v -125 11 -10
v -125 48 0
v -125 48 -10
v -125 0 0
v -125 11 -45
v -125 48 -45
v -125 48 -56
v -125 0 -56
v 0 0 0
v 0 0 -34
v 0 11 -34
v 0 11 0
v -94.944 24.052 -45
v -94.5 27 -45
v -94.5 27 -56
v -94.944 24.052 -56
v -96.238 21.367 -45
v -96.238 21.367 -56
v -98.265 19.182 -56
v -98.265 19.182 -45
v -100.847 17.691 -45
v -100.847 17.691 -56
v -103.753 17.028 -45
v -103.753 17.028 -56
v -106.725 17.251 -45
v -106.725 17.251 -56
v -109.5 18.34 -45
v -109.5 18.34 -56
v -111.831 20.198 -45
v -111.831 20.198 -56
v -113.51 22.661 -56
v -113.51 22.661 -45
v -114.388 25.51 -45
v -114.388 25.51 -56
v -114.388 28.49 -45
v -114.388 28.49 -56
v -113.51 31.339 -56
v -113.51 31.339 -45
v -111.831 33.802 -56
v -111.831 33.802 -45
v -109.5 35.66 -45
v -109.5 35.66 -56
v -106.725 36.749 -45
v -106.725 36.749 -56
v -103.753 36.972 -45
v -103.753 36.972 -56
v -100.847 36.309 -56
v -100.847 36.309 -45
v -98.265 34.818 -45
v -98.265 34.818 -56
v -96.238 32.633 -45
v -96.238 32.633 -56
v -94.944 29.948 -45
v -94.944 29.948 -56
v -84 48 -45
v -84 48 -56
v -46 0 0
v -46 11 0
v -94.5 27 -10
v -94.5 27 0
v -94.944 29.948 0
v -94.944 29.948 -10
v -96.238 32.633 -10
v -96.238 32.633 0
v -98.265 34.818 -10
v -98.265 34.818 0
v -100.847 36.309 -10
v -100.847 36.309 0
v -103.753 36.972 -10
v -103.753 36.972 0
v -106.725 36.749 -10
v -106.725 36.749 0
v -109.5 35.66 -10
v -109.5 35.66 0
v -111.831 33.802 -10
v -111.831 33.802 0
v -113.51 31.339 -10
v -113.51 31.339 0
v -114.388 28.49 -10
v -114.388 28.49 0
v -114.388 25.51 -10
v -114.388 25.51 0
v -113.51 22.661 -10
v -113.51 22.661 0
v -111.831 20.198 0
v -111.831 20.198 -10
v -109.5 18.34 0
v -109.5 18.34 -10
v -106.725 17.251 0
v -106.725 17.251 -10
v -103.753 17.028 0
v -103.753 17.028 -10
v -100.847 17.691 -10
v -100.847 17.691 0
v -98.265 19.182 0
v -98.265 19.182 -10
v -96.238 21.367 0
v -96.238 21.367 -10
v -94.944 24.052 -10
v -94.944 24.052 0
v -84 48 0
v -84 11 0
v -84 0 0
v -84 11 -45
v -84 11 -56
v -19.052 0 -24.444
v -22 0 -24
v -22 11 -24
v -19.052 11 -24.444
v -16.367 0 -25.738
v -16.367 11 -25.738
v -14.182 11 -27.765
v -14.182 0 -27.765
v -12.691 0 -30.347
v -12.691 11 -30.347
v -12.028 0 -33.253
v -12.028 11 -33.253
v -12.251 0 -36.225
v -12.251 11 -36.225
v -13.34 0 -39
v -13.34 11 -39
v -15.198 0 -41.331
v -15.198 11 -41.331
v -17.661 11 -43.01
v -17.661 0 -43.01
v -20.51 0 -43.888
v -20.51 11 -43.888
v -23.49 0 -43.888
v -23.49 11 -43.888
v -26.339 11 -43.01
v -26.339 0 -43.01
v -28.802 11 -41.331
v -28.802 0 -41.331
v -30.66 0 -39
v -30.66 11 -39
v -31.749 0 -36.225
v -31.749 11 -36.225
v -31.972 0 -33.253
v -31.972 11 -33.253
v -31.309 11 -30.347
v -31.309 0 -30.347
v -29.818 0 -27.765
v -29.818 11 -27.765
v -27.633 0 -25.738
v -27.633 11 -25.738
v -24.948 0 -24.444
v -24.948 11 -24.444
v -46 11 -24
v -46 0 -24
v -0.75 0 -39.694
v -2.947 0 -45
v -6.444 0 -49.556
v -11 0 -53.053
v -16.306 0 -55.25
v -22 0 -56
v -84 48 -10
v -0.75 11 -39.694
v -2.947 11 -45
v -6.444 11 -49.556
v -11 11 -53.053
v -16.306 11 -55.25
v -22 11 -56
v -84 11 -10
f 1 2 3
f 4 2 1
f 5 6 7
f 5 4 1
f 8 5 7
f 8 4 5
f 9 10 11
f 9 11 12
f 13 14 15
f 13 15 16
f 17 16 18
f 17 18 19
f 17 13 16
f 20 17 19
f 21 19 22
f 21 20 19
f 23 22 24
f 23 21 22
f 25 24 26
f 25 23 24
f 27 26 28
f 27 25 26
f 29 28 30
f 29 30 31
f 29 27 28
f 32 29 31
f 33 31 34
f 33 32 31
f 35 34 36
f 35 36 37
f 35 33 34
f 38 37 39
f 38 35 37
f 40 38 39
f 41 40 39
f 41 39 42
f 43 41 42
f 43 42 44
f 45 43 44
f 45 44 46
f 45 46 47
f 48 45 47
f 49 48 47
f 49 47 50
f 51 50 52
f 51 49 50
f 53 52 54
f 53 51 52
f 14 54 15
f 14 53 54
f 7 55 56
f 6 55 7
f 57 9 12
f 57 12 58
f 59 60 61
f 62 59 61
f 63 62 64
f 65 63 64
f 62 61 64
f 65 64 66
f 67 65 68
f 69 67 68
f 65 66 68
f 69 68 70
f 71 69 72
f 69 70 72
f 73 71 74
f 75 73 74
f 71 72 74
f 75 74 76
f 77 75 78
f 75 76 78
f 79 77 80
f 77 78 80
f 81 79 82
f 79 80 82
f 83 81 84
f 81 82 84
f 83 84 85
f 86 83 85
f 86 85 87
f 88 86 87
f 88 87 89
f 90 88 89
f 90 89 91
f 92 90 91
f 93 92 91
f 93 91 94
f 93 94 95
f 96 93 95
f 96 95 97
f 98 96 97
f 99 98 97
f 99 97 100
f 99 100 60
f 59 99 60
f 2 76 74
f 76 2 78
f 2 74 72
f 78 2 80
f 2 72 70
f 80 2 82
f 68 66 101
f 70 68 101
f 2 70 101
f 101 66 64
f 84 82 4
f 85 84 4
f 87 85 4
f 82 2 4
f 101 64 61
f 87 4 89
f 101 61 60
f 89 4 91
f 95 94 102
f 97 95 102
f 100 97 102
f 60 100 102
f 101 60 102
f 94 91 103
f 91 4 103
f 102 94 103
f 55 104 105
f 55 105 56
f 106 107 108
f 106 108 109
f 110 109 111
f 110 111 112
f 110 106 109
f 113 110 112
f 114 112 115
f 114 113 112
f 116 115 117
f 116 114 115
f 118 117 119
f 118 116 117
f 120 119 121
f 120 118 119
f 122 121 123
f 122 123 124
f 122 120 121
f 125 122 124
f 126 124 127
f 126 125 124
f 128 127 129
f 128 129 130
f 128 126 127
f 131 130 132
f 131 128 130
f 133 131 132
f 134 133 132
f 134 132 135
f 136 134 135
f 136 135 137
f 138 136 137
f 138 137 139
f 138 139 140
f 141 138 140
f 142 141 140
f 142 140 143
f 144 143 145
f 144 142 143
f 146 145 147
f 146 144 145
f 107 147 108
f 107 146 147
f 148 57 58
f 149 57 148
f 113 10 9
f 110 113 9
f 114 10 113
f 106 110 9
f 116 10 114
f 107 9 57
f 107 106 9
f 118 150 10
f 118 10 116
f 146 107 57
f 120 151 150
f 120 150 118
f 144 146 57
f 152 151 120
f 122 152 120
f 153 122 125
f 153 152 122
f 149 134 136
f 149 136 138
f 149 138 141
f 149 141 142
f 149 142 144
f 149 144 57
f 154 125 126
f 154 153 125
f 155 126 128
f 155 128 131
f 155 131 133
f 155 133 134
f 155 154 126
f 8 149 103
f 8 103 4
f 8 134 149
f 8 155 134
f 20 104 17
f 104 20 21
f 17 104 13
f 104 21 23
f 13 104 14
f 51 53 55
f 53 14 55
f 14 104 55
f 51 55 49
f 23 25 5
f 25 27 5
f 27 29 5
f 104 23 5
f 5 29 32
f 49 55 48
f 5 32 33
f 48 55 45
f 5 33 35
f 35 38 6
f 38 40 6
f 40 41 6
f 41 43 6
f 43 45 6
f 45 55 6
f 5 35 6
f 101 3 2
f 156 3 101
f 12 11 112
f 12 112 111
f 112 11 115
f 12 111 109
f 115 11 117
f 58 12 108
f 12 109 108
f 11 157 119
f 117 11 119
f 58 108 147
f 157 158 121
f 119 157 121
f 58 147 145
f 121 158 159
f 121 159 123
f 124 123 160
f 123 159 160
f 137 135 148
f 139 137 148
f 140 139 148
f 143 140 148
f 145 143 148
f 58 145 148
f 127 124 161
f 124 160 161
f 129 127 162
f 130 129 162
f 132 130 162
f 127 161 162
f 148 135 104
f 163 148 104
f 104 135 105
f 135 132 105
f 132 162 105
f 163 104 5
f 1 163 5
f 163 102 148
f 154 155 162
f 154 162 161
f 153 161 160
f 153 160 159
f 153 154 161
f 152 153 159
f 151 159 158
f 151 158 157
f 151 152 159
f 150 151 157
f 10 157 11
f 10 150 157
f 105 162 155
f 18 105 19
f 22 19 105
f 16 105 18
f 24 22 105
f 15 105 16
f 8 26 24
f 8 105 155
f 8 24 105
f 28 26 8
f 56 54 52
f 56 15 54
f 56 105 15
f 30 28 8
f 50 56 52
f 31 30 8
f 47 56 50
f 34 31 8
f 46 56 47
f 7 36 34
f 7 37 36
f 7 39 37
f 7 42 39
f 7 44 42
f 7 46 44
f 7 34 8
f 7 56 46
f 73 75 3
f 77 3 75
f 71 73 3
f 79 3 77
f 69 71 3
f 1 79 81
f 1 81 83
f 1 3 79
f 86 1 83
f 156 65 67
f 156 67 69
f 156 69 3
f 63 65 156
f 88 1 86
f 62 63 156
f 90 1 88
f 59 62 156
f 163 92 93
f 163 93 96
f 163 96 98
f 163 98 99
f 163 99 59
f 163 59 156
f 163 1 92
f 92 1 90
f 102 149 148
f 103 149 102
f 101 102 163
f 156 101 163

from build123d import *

# Parameters (mm, degrees)
SKETCH1_R           = 10
BOSS_EXTRUDE1_DEPTH = 11
SKETCH3_W           = 41
SKETCH3_H           = 10
BOSS_EXTRUDE2_DEPTH = 37
SKETCH4_R           = 10
CUT_EXTRUDE1_DEPTH  = 37
BOSS_EXTRUDE3_START = -11
SKETCH5_W           = 41
SKETCH5_H           = 37
SKETCH5_R           = 10
BOSS_EXTRUDE3_DEPTH = 11


with BuildPart() as part:
    # Sketch1 → Boss-Extrude1 (new body)
    with BuildSketch(Plane(origin=(0, 0, 0), x_dir=(1, 0, 0), z_dir=(0, 1, 0))):
        with BuildLine():
            Line((0, 0), (-46, 0))
            Line((-46, 0), (-46, 24))
            Line((-46, 24), (-84, 0))
            Line((-84, 0), (-125, 0))
            Line((-125, 0), (-125, 56))
            Line((-125, 56), (-22, 56))
            ThreePointArc((-22, 56), (-6.443650814, 49.556349186), (0, 34))
            Line((0, 34), (0, 0))
        make_face()
        with Locations(Location((-22, 34, 0), (0, 0, 270))):
            Circle(SKETCH1_R, mode=Mode.SUBTRACT)
    extrude(amount=BOSS_EXTRUDE1_DEPTH)

    # Sketch3 → Boss-Extrude2 (add)
    with BuildSketch(Plane(origin=(0, 11, 0), x_dir=(1, 0, 0), z_dir=(0, 1, 0))):
        with Locations((-104.5, 5)):
            Rectangle(SKETCH3_W, SKETCH3_H)
    extrude(amount=BOSS_EXTRUDE2_DEPTH)

    # Sketch4 → Cut-Extrude1 (cut)
    with BuildSketch(Plane.XY):
        with Locations((-104.5, 27)):
            Circle(SKETCH4_R)
    extrude(amount=-CUT_EXTRUDE1_DEPTH, mode=Mode.SUBTRACT)

    # Sketch5 → Boss-Extrude3 (add)
    with BuildSketch(Plane(origin=(0, 0, -56), x_dir=(-1, 0, 0), z_dir=(0, 0, -1)).offset(BOSS_EXTRUDE3_START)):
        with Locations((104.5, 29.5)):
            Rectangle(SKETCH5_W, SKETCH5_H)
        with Locations(Location((104.5, 27, 0), (0, 0, 180))):
            Circle(SKETCH5_R, mode=Mode.SUBTRACT)
    extrude(amount=BOSS_EXTRUDE3_DEPTH)


solid = part.part
